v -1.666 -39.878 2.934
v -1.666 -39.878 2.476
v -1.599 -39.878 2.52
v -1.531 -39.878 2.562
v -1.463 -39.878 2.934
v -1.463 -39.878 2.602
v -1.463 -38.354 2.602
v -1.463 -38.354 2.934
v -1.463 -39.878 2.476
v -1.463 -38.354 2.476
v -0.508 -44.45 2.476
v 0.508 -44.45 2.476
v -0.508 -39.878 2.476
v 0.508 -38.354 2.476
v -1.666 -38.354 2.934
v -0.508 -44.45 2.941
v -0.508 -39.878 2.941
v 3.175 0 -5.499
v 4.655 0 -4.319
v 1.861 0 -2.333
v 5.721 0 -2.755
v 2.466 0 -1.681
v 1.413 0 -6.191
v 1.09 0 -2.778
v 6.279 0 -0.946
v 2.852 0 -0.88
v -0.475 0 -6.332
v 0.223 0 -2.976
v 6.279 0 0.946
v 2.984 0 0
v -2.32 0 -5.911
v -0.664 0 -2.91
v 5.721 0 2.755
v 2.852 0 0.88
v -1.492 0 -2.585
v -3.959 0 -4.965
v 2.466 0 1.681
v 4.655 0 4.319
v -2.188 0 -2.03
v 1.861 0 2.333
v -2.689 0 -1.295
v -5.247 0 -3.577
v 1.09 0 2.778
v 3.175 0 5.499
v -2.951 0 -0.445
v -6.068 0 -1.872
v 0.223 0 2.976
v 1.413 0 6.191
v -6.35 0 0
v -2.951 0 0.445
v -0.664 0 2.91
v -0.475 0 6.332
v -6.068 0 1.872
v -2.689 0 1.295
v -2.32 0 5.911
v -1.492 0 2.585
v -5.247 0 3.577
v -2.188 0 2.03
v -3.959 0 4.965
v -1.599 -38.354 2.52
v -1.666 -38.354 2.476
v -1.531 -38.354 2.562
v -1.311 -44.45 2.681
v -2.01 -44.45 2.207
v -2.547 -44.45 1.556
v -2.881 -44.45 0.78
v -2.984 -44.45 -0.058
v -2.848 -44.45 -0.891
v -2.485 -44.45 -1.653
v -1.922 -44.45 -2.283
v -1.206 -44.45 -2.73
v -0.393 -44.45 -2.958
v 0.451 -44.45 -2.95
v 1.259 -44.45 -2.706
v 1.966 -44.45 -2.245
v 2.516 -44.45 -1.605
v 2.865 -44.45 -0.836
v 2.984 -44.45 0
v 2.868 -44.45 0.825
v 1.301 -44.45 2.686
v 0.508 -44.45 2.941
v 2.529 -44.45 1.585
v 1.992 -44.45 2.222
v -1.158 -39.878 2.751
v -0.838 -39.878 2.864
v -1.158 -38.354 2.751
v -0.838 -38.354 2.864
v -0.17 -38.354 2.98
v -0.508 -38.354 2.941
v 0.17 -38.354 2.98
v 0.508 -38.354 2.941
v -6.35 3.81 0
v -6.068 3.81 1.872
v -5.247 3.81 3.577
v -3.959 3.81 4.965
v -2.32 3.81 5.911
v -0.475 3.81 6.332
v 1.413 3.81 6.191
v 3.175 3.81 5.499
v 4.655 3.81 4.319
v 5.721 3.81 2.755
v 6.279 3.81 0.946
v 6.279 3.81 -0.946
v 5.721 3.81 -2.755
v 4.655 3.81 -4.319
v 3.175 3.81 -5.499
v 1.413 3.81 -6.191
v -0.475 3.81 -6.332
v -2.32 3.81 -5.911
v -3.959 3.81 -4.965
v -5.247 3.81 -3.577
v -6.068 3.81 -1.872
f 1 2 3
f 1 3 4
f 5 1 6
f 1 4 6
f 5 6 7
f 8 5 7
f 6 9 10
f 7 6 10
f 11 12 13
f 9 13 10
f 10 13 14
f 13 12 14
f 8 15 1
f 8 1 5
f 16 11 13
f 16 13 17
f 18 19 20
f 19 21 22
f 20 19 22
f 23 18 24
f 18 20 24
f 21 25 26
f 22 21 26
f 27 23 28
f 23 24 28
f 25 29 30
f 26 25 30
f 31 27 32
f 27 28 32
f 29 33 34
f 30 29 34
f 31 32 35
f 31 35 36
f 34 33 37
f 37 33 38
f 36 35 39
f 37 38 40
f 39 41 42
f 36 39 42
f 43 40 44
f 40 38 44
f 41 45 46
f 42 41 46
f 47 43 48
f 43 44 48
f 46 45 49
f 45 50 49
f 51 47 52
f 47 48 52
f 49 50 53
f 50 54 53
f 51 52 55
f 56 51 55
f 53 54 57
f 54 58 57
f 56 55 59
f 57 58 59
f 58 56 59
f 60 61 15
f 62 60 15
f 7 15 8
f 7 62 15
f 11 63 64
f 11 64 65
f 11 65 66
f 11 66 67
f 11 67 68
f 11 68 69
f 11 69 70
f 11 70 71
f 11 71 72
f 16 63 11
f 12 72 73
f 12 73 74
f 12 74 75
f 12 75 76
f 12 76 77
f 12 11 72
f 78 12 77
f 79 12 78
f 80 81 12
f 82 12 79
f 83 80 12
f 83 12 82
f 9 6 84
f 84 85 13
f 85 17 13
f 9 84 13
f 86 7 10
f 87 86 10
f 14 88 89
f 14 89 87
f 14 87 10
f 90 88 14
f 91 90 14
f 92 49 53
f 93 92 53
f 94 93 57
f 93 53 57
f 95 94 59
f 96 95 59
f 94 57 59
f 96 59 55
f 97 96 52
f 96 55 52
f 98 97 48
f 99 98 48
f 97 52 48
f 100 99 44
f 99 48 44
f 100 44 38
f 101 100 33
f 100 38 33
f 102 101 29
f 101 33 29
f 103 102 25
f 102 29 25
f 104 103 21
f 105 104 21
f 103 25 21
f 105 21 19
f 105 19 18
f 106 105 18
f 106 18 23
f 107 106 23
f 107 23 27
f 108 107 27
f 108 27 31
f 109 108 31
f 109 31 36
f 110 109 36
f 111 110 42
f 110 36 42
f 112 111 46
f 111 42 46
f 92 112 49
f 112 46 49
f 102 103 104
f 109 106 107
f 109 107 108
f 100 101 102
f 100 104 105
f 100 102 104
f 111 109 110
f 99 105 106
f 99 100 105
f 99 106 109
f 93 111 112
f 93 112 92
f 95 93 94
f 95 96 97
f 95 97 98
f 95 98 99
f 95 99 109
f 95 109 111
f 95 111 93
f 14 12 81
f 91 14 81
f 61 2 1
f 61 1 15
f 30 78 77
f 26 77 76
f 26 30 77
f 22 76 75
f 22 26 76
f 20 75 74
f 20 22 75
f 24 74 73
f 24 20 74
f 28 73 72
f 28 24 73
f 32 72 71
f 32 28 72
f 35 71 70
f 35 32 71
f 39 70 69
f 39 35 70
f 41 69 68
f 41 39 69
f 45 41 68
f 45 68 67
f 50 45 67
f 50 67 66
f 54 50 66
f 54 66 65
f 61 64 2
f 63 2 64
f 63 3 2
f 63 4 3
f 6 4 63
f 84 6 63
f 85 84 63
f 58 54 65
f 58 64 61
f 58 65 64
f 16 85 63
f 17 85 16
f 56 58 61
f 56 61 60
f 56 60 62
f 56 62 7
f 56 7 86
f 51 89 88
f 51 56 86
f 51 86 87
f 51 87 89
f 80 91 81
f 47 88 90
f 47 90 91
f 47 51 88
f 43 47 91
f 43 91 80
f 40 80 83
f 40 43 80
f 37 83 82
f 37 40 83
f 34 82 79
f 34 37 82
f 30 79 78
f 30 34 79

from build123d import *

# Parameters (mm, degrees)
F0_R      = 2.9845
F1_DEPTH  = 44.45
F3_R      = 6.35
F4_DEPTH  = 3.81
F5_W      = 1.016
F5_H      = 1.016
F6_DEPTH  = 25.4
F8_DEPTH  = 1.524
F9_W      = 0.2032
F9_H      = 1.524
F10_DEPTH = 0.4572
F11_DEPTH = 19.304


with BuildPart() as f1:
    # F0 (on Front) → F1 (new body)
    with BuildSketch(Plane.XZ):
        Circle(F0_R)
    extrude(amount=F1_DEPTH)

    # F3 (on face) → F4 (join)
    with BuildSketch(Plane(origin=(0, 0, 0), x_dir=(-1, 0, 0), z_dir=(0, 1, 0))):
        Circle(F3_R)
    extrude(amount=F4_DEPTH)

    # F5 (on face) → F6 (cut)
    with BuildSketch(Plane.XZ.offset(44.45)):
        with Locations((0, 2.9843547381)):
            Rectangle(F5_W, F5_H)
    extrude(amount=-F6_DEPTH, mode=Mode.SUBTRACT)

    # F7 (on face) → F8 (cut)
    with BuildSketch(Plane.YZ.offset(-0.508)):
        Polygon((-39.878, 2.9409481889), (-39.878, 2.7086514635), (-39.878, 2.4763547381), (-38.354, 2.4763547381), (-38.354, 2.9409481889), align=None)
    extrude(amount=-F8_DEPTH, mode=Mode.SUBTRACT)

    # F9 (on face) → F10 (join)
    with BuildSketch(Plane.XY.offset(2.4763547381)):
        with Locations((-1.564205349, -39.116)):
            Rectangle(F9_W, F9_H)
    extrude(amount=F10_DEPTH)

    # F11 (add): a face of the model
    f11_faces = [f1.faces().sort_by_distance(p)[0] for p in [
        (0, -19.05, 2.7233604539),
    ]]
    extrude(f11_faces, amount=F11_DEPTH)


solid = f1.part
